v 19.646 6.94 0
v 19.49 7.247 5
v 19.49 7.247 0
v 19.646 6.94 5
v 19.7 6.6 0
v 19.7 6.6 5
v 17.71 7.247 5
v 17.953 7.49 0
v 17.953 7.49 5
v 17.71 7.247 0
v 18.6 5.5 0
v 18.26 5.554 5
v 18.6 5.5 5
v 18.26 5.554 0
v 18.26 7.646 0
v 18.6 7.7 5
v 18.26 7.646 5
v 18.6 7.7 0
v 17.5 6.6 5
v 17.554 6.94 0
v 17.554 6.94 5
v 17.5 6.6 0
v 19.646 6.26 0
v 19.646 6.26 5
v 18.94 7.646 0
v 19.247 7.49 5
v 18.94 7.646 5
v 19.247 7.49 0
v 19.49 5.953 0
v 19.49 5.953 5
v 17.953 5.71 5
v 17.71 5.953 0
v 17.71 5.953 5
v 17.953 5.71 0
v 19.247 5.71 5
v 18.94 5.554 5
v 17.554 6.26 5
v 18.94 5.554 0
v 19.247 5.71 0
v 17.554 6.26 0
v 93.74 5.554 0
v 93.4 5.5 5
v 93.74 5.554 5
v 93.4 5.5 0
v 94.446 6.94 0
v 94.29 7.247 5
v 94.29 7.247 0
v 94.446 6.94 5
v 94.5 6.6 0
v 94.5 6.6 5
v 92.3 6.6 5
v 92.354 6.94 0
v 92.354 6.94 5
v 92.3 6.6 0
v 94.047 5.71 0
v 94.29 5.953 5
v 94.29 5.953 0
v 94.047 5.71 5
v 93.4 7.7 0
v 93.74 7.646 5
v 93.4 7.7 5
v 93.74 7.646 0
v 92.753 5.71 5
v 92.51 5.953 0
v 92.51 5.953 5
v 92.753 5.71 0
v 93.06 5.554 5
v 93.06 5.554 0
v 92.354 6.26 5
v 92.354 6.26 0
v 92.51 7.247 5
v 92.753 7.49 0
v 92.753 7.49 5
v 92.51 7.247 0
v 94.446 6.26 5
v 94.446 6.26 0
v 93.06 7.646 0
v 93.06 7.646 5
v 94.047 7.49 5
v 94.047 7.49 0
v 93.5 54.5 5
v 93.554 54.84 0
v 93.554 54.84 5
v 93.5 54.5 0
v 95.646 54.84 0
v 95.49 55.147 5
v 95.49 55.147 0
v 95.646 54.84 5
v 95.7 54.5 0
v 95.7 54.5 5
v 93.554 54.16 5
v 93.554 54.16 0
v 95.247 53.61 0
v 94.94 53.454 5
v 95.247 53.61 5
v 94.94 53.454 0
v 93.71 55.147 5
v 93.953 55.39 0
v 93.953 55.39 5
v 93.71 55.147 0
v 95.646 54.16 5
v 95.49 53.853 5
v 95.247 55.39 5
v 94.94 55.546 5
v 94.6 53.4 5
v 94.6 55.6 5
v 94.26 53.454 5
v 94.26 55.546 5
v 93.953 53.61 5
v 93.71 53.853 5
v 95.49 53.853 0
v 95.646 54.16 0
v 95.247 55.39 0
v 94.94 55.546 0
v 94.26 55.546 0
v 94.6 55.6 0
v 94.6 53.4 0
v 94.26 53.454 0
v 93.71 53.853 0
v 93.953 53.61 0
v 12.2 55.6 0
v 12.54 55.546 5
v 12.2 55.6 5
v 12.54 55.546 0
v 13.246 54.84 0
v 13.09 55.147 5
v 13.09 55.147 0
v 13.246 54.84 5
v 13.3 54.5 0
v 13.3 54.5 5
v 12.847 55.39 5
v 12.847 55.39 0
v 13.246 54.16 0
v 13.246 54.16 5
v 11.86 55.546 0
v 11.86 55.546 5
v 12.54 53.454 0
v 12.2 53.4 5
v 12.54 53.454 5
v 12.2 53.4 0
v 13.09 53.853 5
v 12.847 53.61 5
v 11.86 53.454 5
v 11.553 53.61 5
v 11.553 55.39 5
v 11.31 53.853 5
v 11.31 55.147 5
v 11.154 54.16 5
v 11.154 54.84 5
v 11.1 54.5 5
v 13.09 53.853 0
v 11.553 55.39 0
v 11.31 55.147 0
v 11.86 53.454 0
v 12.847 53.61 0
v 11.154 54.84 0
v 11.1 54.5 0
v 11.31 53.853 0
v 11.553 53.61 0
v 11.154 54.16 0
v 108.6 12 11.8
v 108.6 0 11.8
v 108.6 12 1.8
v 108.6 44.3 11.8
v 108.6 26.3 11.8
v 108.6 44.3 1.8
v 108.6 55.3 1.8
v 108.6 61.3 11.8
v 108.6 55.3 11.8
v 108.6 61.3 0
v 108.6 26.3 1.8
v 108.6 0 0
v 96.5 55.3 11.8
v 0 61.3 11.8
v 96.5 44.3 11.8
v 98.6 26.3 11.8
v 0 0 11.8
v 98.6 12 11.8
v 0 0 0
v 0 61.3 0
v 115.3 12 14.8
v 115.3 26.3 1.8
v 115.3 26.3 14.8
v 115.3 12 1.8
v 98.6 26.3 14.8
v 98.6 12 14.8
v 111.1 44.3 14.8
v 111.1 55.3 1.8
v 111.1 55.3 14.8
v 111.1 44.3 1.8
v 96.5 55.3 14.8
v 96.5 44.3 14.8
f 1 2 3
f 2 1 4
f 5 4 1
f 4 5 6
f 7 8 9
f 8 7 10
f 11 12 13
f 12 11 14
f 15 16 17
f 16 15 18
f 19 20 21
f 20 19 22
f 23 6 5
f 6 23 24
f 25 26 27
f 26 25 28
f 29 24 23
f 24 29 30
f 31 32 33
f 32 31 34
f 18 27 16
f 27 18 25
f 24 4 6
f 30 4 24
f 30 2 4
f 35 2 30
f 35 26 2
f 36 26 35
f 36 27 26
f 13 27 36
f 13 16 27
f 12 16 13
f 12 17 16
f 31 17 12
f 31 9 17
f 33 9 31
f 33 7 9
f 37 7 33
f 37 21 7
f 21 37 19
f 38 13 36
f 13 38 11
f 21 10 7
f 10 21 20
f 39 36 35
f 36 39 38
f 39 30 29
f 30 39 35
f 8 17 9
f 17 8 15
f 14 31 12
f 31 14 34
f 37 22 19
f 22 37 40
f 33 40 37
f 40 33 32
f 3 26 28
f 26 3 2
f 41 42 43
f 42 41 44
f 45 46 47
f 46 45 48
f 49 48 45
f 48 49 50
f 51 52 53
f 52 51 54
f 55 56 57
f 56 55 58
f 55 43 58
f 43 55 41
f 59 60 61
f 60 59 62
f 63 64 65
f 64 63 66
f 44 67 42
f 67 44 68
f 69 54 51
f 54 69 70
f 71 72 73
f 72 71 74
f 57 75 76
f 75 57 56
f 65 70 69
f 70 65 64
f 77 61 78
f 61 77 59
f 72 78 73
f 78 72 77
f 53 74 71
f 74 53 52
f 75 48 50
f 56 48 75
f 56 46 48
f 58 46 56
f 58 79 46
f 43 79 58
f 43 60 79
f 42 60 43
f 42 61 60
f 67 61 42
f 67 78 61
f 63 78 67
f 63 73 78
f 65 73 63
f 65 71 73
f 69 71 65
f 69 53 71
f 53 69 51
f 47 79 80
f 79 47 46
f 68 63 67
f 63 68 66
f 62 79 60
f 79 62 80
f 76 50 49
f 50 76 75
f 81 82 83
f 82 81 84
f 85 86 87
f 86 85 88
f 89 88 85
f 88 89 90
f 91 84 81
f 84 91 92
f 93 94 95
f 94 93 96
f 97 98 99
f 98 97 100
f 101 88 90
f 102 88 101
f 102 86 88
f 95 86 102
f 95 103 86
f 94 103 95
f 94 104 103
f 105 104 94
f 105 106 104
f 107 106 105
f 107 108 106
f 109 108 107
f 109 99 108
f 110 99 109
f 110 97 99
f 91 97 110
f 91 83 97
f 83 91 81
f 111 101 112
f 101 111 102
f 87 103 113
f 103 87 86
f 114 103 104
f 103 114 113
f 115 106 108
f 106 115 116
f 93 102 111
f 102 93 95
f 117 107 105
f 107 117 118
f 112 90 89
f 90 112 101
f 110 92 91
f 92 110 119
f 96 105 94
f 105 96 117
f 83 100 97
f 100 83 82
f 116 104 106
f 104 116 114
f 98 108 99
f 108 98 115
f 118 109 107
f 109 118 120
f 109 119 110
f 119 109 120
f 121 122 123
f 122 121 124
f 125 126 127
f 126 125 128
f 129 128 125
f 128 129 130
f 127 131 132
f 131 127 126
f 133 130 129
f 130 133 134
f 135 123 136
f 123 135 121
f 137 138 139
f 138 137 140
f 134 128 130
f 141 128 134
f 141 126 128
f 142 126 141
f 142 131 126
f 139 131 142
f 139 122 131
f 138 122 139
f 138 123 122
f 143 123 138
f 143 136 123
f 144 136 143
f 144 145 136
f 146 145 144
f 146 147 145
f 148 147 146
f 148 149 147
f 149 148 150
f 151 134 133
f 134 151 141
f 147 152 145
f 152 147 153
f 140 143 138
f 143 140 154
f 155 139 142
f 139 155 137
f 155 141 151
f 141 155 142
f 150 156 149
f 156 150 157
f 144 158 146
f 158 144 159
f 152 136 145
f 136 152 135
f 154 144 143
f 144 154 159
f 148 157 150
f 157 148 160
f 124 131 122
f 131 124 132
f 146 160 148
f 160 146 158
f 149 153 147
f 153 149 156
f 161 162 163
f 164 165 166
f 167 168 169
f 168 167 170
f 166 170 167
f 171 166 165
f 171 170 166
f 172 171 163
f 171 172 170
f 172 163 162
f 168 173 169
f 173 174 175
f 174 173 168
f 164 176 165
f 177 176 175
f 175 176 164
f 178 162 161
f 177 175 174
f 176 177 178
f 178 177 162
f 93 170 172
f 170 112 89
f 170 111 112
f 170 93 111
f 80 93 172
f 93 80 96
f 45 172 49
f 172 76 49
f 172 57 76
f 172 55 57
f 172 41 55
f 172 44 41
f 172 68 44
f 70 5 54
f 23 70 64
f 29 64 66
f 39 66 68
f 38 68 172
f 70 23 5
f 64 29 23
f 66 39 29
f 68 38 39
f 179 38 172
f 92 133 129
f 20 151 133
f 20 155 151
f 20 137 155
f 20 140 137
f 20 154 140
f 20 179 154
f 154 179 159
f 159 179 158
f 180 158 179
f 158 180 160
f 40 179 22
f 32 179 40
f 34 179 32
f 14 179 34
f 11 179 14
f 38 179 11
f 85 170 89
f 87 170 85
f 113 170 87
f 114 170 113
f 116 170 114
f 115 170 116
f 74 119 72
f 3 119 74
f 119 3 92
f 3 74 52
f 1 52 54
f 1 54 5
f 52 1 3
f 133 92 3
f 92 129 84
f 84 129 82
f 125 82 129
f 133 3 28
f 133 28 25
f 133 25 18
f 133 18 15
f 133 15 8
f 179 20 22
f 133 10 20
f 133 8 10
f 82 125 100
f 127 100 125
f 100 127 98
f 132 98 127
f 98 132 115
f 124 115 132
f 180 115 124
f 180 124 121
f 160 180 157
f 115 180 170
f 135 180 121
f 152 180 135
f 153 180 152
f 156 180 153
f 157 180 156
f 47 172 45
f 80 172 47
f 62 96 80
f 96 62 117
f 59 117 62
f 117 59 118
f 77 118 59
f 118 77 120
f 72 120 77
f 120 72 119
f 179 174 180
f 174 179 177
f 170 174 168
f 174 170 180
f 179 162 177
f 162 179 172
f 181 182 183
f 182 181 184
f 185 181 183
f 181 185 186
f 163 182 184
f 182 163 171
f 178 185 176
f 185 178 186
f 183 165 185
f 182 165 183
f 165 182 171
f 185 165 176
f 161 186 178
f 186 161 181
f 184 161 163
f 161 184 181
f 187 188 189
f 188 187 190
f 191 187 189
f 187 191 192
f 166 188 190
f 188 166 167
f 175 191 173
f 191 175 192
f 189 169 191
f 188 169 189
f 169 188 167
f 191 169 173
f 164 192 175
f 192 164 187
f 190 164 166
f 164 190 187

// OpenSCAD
length = 101.6;
width = 53.3;



module mega_from_svg(){
    plug_h = 11; // height of usb/power components
    h_base = 1.6 + 1.2; // thickness of pcb + space for soldering underneath
    color("blue",0.2)linear_extrude(height = h_base)import (file = "arduino_cad.dxf", layer = "pcb");
    color("green",0.2)translate([0,0,h_base])linear_extrude(height = plug_h)import (file = "arduino_cad.dxf", layer = "usb");
    color("green",0.2)translate([0,0,h_base])linear_extrude(height = plug_h)import (file = "arduino_cad.dxf", layer = "power");
    color("red",0.2)linear_extrude(height = plug_h)import (file = "arduino_cad.dxf", layer = "mounting_holes");
}

module mega(){
    pp = 2; // padding around the plug
    h_pad = 0; // padding above the main body of the arduino
    s_pad = 4; // padding on the left and right
    e_pad = 7; // padding at the end
    m_slack = 1; // slack to leave for mount holes
    
    plug_h = 11; // height of usb/power components
    h_base = 1.6 + 1.2; // thickness of pcb + space for soldering underneath
    header_h = 9;
    m_r = 1.6 - m_slack/2;
    m_h = 5;
    
    translate([e_pad,s_pad,0]){
        // plugs
        translate([91.6,9-pp/2,h_base-pp/2])cube([16.7, 12.3+pp, plug_h+pp]);
        translate([89.5,41.3-pp/2,h_base-pp/2])cube([14.6, 9+pp, plug_h+pp]);

        difference(){
            // base
            translate([-e_pad,-s_pad,0])cube([length+e_pad, width+2*s_pad, h_base+header_h+h_pad]);

            // mounting holes
            union(){
                translate([11.6,2.6,-1])cylinder(m_h+1,m_r,m_r,$fn=20);
                translate([86.4,2.6,-1])cylinder(m_h+1,m_r,m_r,$fn=20);
                translate([87.6,50.5,-1])cylinder(m_h+1,m_r,m_r,$fn=20);
                translate([5.2,50.5,-1])cylinder(m_h+1,m_r,m_r,$fn=20);
            }
        }
    }
}

mega(2,1,0,0,10);
